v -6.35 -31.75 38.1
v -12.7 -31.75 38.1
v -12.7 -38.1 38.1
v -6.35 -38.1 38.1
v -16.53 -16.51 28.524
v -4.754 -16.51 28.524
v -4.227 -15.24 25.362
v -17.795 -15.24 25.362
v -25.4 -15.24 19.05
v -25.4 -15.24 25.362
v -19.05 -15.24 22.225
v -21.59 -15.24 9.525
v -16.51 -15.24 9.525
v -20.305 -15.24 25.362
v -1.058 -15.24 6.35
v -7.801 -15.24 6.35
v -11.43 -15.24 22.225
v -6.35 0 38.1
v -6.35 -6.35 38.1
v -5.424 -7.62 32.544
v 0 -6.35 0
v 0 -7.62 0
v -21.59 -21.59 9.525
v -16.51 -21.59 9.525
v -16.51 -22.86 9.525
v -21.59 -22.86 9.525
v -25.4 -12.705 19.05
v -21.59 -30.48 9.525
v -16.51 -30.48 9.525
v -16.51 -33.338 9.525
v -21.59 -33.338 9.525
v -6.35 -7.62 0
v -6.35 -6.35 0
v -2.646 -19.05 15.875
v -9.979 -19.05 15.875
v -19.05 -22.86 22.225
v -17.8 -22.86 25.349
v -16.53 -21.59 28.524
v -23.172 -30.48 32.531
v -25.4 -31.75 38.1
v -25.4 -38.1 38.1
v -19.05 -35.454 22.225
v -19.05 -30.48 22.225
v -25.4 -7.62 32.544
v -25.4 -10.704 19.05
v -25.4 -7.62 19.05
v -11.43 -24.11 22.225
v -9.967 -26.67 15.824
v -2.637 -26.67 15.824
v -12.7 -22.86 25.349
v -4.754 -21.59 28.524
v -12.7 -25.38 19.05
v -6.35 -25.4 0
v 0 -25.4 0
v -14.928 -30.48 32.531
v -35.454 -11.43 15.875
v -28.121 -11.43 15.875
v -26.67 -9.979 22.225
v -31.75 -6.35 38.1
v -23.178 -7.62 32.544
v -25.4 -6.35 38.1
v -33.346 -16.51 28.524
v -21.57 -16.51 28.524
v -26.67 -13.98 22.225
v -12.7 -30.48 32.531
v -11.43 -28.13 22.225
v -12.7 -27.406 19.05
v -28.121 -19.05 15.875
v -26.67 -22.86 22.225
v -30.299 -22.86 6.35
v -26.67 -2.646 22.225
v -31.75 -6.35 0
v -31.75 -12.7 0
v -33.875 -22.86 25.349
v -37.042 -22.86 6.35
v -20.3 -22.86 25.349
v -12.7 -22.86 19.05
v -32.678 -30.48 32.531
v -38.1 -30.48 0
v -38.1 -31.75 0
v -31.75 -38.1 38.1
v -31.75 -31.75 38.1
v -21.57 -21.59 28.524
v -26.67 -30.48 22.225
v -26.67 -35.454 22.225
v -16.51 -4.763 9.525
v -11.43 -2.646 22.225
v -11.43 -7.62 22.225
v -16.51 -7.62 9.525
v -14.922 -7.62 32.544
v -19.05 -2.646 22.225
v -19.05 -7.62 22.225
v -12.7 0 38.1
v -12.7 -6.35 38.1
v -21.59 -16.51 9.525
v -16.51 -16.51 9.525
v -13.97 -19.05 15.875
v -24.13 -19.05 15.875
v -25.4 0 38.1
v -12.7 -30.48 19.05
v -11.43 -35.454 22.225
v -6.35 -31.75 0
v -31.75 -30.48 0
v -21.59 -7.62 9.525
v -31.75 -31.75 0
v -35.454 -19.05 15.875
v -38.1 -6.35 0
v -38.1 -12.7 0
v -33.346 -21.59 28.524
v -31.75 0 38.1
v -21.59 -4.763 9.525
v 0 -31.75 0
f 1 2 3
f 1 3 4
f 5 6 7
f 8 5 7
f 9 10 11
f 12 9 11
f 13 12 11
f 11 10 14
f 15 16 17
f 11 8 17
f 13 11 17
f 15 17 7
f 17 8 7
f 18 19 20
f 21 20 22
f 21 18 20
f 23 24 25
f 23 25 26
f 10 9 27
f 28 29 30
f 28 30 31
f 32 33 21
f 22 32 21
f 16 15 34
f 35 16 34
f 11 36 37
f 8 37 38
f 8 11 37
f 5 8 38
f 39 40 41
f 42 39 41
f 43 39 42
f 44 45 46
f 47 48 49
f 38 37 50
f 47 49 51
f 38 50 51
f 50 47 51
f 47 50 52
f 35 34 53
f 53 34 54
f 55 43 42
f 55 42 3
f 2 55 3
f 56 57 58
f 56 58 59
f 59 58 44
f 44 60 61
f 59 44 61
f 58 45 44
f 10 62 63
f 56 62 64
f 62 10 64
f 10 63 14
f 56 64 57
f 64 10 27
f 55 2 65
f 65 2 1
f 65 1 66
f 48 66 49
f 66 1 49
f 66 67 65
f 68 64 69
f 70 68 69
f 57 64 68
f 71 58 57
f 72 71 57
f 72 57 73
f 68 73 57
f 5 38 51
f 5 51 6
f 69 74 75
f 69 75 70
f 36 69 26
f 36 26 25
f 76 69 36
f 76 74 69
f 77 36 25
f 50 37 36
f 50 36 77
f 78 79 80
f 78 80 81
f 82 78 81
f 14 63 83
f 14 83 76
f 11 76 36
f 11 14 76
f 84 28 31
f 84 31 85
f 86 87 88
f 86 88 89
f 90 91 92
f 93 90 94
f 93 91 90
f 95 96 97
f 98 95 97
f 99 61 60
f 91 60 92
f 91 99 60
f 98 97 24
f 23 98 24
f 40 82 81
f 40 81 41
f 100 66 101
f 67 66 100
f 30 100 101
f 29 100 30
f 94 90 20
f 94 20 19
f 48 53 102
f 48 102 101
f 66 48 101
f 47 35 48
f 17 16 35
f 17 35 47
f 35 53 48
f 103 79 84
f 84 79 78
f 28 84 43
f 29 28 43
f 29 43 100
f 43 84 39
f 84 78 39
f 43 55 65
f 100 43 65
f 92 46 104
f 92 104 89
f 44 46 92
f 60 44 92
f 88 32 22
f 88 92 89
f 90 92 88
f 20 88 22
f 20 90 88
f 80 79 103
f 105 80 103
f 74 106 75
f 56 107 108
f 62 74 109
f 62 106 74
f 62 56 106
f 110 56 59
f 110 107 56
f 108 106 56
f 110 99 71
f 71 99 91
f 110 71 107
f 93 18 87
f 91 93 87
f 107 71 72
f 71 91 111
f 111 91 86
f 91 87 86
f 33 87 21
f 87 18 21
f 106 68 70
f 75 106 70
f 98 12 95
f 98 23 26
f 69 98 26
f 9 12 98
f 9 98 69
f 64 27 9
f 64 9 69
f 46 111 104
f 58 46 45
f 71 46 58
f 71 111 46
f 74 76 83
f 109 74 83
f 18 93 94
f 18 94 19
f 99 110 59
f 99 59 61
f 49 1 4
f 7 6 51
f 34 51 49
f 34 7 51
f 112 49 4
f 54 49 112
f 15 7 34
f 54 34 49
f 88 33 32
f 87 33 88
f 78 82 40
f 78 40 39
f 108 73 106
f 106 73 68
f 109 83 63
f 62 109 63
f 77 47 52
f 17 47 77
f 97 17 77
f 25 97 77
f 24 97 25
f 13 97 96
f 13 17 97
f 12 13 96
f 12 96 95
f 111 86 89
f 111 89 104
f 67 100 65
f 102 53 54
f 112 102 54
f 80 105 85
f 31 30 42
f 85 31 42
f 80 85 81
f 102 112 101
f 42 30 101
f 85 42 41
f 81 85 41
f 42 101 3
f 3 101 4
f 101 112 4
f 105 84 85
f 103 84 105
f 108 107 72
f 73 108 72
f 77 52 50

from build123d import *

# Parameters (mm, degrees)
F0_W     = 38.1
F0_H     = 38.1
F1_DEPTH = 38.1
F5_DEPTH = 38.1
F7_DEPTH = 38.1
F8_W     = 25.4
F8_H     = 7.62
F9_DEPTH = 38.1


with BuildPart() as f1:
    # F0 (on Front) → F1 (new body)
    with BuildSketch(Plane.XZ):
        with Locations((-19.05, 19.05)):
            Rectangle(F0_W, F0_H)
    extrude(amount=F1_DEPTH)

    # F4 (on offset) → F5 (cut)
    with BuildSketch(Plane.YZ):
        Polygon((-11.43, 15.875), (-6.35, 38.1), (-31.75, 38.1), (-26.67, 15.824118), (-21.59, 28.524118), (-16.51, 28.524118), align=None)
        Polygon((-38.1, 0), (-31.75, 0), (-38.1, 38.1), align=None)
        Polygon((-25.4, 0), (-12.7, 0), (-19.05, 15.875), align=None)
        Polygon((-6.35, 0), (0, 0), (0, 38.1), align=None)
    extrude(amount=-F5_DEPTH, mode=Mode.SUBTRACT)

    # F6 (on Front) → F7 (cut)
    with BuildSketch(Plane.XZ):
        Polygon((0, 0), (0, 38.1), (-6.35, 38.1), align=None)
        Polygon((-19.05, 22.225), (-12.7, 38.1), (-25.4, 38.1), align=None)
        Polygon((-38.1, 0), (-31.75, 38.1), (-38.1, 38.1), align=None)
        Polygon((-31.75, 0), (-6.35, 0), (-11.43, 22.225), (-16.51, 9.525), (-21.59, 9.525), (-26.67, 22.225), align=None)
    extrude(amount=F7_DEPTH, mode=Mode.SUBTRACT)

    # F8 (on offset) → F9 (cut)
    with BuildSketch(Plane.XY.offset(38.1)):
        with Locations((-25.4, -26.67)):
            Rectangle(F8_W, F8_H)
        with Locations((-12.7, -11.43)):
            Rectangle(F8_W, F8_H)
    extrude(amount=-F9_DEPTH, mode=Mode.SUBTRACT)


solid = f1.part
